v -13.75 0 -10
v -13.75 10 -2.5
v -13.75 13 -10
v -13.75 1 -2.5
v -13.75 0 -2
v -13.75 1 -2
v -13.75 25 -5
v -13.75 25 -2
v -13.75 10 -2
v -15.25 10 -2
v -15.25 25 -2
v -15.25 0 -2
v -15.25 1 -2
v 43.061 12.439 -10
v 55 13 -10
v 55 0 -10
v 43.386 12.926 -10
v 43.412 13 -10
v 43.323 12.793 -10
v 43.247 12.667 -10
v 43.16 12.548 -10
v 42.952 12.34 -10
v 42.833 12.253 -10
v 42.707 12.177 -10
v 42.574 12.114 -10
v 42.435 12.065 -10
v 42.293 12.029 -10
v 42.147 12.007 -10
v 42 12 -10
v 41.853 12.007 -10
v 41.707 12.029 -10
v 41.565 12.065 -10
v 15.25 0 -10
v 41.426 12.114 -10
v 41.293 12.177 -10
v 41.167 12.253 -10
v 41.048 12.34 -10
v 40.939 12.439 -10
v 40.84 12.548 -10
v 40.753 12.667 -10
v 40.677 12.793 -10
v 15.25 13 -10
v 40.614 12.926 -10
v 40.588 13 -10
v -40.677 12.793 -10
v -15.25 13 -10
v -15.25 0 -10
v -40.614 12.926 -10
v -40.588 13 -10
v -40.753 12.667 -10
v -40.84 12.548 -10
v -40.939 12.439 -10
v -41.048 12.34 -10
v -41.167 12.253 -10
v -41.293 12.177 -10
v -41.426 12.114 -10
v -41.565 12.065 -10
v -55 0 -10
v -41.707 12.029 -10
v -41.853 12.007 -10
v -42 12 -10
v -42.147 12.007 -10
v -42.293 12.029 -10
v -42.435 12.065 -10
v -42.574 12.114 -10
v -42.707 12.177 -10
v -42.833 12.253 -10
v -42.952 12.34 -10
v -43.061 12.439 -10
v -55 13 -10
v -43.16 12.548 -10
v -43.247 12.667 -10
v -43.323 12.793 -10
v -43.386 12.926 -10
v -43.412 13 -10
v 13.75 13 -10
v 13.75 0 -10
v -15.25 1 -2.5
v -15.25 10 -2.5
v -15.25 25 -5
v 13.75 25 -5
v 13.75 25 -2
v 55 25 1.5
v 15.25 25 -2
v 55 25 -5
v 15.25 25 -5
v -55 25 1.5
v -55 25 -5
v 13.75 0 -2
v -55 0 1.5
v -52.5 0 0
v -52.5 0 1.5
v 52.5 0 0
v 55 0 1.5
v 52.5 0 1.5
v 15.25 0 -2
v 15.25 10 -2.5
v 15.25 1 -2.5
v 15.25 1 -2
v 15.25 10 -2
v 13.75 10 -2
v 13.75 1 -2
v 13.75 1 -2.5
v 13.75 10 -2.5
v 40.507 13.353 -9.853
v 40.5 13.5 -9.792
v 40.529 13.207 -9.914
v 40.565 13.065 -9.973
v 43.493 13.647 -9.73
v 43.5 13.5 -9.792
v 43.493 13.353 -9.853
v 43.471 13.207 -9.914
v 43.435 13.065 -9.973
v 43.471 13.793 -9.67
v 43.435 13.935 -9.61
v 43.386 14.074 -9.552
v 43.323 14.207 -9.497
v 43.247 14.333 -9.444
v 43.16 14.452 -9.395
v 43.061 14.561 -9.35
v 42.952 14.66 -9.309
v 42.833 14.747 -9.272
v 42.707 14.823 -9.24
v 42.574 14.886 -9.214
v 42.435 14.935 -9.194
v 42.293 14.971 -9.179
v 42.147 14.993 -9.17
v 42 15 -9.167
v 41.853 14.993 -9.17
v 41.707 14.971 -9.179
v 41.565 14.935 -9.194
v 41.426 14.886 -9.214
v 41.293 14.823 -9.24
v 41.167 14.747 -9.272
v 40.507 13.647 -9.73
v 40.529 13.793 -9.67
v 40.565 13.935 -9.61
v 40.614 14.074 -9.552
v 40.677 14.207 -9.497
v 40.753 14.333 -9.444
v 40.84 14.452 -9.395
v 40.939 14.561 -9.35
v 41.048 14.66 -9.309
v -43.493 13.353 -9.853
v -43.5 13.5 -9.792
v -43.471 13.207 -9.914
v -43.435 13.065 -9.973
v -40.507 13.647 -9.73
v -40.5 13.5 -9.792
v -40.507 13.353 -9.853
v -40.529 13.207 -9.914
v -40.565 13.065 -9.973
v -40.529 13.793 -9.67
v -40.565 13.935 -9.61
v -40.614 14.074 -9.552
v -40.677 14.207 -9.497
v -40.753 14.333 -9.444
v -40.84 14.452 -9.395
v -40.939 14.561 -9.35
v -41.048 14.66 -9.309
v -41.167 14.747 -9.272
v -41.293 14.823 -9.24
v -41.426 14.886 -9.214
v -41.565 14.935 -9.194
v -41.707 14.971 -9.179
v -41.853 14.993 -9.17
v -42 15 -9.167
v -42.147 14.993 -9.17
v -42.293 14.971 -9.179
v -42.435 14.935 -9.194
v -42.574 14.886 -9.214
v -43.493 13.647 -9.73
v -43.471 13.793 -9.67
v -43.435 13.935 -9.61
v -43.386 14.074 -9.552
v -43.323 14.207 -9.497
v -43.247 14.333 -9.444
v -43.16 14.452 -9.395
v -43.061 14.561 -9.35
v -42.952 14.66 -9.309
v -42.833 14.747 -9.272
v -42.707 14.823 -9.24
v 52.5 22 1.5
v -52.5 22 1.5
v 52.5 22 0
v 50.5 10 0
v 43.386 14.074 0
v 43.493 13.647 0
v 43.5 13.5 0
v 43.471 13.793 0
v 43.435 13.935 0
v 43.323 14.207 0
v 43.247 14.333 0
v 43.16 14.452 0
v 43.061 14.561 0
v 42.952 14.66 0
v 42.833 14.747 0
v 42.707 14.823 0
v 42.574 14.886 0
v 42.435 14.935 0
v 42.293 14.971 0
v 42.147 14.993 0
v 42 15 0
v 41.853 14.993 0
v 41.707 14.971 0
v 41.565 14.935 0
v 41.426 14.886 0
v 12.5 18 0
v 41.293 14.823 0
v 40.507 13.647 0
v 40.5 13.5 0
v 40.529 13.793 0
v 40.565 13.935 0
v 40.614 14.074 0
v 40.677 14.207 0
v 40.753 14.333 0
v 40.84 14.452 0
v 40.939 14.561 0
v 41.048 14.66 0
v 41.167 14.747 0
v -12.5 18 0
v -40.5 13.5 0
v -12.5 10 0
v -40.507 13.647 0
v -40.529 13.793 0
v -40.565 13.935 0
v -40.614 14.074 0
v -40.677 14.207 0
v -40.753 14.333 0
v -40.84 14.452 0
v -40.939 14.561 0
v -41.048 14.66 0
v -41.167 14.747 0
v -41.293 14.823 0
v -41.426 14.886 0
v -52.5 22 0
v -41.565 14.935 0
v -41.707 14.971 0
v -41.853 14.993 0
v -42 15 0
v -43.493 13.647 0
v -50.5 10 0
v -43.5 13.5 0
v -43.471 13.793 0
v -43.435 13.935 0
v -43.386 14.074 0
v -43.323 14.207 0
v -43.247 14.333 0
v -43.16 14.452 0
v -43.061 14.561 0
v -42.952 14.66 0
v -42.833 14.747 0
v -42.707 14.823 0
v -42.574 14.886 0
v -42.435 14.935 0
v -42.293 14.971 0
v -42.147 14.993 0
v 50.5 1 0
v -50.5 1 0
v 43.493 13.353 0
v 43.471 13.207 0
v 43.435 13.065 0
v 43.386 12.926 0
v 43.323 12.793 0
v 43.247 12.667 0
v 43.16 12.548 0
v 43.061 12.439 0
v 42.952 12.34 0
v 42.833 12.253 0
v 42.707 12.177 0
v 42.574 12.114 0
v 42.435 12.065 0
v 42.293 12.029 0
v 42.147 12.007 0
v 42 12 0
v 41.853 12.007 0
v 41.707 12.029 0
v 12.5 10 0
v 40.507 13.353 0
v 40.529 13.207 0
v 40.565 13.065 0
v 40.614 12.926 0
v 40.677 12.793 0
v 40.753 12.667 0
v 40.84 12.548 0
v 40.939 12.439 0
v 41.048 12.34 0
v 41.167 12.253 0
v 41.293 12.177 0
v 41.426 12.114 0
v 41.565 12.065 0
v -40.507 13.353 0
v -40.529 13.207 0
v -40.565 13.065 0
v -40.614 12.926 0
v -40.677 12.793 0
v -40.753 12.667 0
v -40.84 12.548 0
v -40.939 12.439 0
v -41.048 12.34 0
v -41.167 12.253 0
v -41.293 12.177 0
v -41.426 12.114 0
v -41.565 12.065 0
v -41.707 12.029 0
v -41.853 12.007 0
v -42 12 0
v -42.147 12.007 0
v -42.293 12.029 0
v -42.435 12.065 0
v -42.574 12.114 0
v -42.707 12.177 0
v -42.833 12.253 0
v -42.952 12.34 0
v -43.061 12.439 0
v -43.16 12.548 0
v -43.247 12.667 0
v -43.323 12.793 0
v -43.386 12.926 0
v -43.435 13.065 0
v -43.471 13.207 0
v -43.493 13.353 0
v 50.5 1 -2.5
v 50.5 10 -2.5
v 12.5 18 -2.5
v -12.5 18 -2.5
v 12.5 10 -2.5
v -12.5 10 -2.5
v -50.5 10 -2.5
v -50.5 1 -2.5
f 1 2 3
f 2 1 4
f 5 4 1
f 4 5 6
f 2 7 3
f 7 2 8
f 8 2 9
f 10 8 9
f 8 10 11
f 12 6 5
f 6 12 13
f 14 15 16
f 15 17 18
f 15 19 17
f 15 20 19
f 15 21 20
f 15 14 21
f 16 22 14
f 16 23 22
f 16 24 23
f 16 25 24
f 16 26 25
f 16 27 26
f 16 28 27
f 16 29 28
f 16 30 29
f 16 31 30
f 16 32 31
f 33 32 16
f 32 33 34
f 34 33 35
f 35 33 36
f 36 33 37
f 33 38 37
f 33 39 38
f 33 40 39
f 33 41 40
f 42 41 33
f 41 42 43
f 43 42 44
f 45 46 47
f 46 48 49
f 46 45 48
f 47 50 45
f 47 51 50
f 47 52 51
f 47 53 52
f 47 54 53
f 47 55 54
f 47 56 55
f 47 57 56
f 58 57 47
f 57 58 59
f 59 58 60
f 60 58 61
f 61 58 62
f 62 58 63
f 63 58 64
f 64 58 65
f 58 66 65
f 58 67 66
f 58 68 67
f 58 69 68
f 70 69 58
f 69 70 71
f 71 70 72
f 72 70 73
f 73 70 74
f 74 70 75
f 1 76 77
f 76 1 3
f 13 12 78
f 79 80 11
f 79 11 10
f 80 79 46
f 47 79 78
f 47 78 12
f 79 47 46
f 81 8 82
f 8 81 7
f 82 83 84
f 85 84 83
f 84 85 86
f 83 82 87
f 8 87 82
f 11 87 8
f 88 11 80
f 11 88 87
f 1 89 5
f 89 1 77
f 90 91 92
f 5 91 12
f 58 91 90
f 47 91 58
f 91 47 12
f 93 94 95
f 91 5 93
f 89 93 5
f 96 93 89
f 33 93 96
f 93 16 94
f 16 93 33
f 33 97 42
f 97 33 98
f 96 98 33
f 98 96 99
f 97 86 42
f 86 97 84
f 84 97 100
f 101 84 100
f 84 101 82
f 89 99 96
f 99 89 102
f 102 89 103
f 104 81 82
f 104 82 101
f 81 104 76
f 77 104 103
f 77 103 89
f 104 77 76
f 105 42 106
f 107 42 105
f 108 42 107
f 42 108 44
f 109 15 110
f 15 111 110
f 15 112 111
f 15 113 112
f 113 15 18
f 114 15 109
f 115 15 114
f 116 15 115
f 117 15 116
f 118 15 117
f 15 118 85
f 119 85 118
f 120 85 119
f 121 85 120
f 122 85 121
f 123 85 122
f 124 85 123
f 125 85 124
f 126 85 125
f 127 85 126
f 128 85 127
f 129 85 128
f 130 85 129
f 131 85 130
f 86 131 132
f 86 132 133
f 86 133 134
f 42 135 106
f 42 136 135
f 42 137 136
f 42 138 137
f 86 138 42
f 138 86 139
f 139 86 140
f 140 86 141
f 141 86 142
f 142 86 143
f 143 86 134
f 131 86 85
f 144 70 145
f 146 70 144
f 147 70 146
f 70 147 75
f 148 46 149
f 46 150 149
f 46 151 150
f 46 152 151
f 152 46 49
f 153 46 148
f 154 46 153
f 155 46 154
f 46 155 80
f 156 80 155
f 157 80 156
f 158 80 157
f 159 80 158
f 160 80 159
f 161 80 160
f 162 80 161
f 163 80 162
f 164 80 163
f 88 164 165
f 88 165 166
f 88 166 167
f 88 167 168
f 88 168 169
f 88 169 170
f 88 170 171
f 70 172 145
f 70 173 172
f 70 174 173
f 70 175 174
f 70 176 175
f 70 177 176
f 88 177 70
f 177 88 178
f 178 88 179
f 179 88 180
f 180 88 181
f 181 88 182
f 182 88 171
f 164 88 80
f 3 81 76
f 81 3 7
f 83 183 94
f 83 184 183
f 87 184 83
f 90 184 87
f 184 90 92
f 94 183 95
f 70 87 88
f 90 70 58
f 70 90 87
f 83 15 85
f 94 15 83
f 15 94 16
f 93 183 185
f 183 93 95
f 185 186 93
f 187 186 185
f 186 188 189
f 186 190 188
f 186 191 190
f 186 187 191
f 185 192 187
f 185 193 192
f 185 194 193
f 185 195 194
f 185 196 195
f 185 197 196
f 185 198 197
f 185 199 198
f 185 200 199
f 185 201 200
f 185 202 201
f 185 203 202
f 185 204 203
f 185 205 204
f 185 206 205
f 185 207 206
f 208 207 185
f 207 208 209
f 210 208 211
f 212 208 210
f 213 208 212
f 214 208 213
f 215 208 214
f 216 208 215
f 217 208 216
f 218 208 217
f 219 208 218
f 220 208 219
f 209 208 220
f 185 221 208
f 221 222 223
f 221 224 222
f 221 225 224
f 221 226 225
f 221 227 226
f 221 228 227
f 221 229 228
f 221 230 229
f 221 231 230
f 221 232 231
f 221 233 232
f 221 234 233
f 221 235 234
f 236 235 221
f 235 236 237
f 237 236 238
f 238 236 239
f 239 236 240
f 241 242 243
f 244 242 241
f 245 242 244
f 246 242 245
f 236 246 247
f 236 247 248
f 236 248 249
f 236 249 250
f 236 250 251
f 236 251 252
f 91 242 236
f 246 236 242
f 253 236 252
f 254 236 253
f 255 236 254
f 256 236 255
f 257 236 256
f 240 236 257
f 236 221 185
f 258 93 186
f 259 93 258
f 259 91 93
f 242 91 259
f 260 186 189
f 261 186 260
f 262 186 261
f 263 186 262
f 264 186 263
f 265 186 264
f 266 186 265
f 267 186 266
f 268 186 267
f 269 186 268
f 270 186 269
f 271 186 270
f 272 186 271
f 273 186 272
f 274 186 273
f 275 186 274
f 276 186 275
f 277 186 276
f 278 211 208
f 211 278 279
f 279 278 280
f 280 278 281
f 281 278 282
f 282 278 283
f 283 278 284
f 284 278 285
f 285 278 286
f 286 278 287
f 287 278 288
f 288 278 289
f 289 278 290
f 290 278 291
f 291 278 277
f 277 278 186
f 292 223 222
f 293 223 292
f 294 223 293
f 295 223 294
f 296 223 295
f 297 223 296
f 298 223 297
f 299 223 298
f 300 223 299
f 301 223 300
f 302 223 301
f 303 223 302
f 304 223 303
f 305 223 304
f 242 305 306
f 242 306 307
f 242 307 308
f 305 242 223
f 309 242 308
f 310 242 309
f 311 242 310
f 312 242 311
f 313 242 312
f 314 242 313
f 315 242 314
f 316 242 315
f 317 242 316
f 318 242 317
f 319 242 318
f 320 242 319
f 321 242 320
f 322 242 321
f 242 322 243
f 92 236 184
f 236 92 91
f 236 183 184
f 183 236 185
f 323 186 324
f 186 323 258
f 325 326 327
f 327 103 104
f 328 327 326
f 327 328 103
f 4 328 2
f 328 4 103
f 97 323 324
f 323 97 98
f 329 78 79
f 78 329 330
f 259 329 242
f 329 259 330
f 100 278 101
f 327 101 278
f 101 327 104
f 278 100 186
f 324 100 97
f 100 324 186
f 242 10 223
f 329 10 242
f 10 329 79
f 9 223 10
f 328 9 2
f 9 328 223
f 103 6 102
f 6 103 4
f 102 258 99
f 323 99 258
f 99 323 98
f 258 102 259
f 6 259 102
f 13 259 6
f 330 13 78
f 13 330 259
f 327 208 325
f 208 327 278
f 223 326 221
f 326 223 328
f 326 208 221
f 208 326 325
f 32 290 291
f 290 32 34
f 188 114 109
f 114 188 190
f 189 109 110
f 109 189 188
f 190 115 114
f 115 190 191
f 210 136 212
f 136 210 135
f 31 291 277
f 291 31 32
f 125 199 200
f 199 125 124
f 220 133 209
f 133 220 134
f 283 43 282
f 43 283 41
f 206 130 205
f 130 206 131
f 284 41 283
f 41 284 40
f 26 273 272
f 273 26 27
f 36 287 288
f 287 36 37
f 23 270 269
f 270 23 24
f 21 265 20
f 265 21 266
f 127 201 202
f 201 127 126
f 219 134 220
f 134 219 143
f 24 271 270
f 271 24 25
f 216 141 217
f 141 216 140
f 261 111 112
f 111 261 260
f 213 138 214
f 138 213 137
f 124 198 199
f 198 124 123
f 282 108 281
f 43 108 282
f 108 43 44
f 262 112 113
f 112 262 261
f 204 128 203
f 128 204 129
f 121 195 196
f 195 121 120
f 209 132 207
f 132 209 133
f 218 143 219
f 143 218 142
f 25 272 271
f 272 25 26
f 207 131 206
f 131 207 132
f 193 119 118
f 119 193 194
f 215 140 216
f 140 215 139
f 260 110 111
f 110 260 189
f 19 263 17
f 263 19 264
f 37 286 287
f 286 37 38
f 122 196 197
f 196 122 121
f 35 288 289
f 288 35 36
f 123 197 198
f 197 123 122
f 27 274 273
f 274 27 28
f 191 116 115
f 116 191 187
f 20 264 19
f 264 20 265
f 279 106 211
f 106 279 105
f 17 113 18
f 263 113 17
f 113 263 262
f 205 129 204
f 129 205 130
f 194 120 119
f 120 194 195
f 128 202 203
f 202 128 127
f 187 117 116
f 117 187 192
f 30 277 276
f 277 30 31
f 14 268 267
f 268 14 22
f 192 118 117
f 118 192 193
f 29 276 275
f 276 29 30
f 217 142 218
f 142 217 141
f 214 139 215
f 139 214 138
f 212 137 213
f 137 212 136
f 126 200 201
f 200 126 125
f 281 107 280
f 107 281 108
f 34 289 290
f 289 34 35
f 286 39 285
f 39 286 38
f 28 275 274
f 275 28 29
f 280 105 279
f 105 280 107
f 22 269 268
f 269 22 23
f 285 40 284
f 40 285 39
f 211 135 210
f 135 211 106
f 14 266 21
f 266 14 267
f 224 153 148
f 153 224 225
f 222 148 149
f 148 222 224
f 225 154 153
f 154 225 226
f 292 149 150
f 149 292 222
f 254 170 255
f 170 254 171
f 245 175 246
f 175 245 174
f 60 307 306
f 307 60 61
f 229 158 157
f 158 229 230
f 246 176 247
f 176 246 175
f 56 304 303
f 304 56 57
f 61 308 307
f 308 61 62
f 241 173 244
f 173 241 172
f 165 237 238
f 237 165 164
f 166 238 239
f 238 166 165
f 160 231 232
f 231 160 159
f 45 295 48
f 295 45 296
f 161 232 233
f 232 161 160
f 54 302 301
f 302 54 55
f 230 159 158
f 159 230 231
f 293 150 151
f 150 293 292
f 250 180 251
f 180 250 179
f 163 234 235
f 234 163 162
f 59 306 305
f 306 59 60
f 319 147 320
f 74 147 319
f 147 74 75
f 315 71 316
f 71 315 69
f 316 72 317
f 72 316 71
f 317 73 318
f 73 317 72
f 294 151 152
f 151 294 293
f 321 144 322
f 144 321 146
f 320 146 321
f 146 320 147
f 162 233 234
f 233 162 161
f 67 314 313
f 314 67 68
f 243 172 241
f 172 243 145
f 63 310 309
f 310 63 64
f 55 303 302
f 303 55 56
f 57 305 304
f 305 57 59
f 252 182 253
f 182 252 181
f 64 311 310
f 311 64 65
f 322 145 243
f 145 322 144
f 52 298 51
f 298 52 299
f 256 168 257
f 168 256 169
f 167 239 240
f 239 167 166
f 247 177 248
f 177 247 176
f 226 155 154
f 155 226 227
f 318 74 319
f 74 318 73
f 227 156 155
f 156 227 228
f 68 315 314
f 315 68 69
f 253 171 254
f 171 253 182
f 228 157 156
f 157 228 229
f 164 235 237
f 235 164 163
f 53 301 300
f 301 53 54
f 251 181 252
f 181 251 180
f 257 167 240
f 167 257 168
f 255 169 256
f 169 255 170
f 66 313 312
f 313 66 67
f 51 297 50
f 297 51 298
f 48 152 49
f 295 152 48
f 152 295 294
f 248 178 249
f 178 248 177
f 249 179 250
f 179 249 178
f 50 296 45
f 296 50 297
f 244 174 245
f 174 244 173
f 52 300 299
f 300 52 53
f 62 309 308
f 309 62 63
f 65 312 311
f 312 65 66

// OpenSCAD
// Display control mount
//
// Ryan Crosby 2019
//

$fn=64;


module display_control_mount() {
    board_thickness = 1.5;
    
    module control_board() {
        board_width = 105;
        board_length = 22;
        
        board_keepout_y_offset = 1;
        board_keepout_front_width = board_width - 4;
        board_keepout_front_length = 10 - board_keepout_y_offset;
        board_keepout_back_width = 25;
        board_keepout_back_length = 18 - board_keepout_y_offset;
        
        board_keepout_thickness= 4;
        
        translate([-board_width / 2, 0, 0])
        cube([board_width, board_length, board_thickness]);
        
        translate([-board_keepout_front_width / 2, board_keepout_y_offset, -board_keepout_thickness + board_thickness])
        cube([board_keepout_front_width, board_keepout_front_length, board_keepout_thickness]);
        
        translate([-board_keepout_back_width / 2, board_keepout_y_offset, -board_keepout_thickness + board_thickness])
        cube([board_keepout_back_width, board_keepout_back_length, board_keepout_thickness]);
    }
    
    module screw_holes() {
        screw_x_dist = 84;
        screw_y_offset = 13.5;
        screw_hole_diameter = 4;
        screw_diameter = 3;
        screw_height = 10;
        
        union() {
            
            // Top halves of screw (wider)
            translate([screw_x_dist / 2, screw_y_offset, screw_height / 2])
            cylinder(d = screw_hole_diameter, h = screw_height, center = true);

            translate([-screw_x_dist / 2, screw_y_offset, screw_height / 2])
            cylinder(d = screw_hole_diameter, h = screw_height, center = true);
            
            // Bottom half of screw for thread to grab (smaller)
            translate([screw_x_dist / 2, screw_y_offset, -screw_height / 2])
            cylinder(d = screw_diameter, h = screw_height, center = true);

            translate([-screw_x_dist / 2, screw_y_offset, -screw_height / 2])
            cylinder(d = screw_diameter, h = screw_height, center = true);
        }
    }
    
    module mount_body() {
        tab_x_dist = 29;
        tab_width = 1 + 0.5; // 1mm with 0.5mm tolerence
        tab_height = 8;
        tab_roof_height = 2;
        
        body_width = 110;
        body_length = 25;
        body_height = tab_height + tab_roof_height;
        
        difference() {
            hull() {
                translate([-body_width / 2, 0, -body_height])
                cube([body_width, 13, body_height + board_thickness]);
                
                translate([-body_width / 2, body_length - 1, -5])
                cube([body_width, 1, 5 + board_thickness]);
            }
            
            #union() {
                translate([(-tab_x_dist / 2) - (tab_width / 2), 0, -body_height])
                cube([tab_width, body_length, tab_height]);
            
                translate([(tab_x_dist / 2) - (tab_width / 2), 0, -body_height])
                cube([tab_width, body_length, tab_height]);
            }
        }
    }
    
    
    difference() {
        mount_body();
        #control_board();
        #screw_holes();
    }
}

display_control_mount();
